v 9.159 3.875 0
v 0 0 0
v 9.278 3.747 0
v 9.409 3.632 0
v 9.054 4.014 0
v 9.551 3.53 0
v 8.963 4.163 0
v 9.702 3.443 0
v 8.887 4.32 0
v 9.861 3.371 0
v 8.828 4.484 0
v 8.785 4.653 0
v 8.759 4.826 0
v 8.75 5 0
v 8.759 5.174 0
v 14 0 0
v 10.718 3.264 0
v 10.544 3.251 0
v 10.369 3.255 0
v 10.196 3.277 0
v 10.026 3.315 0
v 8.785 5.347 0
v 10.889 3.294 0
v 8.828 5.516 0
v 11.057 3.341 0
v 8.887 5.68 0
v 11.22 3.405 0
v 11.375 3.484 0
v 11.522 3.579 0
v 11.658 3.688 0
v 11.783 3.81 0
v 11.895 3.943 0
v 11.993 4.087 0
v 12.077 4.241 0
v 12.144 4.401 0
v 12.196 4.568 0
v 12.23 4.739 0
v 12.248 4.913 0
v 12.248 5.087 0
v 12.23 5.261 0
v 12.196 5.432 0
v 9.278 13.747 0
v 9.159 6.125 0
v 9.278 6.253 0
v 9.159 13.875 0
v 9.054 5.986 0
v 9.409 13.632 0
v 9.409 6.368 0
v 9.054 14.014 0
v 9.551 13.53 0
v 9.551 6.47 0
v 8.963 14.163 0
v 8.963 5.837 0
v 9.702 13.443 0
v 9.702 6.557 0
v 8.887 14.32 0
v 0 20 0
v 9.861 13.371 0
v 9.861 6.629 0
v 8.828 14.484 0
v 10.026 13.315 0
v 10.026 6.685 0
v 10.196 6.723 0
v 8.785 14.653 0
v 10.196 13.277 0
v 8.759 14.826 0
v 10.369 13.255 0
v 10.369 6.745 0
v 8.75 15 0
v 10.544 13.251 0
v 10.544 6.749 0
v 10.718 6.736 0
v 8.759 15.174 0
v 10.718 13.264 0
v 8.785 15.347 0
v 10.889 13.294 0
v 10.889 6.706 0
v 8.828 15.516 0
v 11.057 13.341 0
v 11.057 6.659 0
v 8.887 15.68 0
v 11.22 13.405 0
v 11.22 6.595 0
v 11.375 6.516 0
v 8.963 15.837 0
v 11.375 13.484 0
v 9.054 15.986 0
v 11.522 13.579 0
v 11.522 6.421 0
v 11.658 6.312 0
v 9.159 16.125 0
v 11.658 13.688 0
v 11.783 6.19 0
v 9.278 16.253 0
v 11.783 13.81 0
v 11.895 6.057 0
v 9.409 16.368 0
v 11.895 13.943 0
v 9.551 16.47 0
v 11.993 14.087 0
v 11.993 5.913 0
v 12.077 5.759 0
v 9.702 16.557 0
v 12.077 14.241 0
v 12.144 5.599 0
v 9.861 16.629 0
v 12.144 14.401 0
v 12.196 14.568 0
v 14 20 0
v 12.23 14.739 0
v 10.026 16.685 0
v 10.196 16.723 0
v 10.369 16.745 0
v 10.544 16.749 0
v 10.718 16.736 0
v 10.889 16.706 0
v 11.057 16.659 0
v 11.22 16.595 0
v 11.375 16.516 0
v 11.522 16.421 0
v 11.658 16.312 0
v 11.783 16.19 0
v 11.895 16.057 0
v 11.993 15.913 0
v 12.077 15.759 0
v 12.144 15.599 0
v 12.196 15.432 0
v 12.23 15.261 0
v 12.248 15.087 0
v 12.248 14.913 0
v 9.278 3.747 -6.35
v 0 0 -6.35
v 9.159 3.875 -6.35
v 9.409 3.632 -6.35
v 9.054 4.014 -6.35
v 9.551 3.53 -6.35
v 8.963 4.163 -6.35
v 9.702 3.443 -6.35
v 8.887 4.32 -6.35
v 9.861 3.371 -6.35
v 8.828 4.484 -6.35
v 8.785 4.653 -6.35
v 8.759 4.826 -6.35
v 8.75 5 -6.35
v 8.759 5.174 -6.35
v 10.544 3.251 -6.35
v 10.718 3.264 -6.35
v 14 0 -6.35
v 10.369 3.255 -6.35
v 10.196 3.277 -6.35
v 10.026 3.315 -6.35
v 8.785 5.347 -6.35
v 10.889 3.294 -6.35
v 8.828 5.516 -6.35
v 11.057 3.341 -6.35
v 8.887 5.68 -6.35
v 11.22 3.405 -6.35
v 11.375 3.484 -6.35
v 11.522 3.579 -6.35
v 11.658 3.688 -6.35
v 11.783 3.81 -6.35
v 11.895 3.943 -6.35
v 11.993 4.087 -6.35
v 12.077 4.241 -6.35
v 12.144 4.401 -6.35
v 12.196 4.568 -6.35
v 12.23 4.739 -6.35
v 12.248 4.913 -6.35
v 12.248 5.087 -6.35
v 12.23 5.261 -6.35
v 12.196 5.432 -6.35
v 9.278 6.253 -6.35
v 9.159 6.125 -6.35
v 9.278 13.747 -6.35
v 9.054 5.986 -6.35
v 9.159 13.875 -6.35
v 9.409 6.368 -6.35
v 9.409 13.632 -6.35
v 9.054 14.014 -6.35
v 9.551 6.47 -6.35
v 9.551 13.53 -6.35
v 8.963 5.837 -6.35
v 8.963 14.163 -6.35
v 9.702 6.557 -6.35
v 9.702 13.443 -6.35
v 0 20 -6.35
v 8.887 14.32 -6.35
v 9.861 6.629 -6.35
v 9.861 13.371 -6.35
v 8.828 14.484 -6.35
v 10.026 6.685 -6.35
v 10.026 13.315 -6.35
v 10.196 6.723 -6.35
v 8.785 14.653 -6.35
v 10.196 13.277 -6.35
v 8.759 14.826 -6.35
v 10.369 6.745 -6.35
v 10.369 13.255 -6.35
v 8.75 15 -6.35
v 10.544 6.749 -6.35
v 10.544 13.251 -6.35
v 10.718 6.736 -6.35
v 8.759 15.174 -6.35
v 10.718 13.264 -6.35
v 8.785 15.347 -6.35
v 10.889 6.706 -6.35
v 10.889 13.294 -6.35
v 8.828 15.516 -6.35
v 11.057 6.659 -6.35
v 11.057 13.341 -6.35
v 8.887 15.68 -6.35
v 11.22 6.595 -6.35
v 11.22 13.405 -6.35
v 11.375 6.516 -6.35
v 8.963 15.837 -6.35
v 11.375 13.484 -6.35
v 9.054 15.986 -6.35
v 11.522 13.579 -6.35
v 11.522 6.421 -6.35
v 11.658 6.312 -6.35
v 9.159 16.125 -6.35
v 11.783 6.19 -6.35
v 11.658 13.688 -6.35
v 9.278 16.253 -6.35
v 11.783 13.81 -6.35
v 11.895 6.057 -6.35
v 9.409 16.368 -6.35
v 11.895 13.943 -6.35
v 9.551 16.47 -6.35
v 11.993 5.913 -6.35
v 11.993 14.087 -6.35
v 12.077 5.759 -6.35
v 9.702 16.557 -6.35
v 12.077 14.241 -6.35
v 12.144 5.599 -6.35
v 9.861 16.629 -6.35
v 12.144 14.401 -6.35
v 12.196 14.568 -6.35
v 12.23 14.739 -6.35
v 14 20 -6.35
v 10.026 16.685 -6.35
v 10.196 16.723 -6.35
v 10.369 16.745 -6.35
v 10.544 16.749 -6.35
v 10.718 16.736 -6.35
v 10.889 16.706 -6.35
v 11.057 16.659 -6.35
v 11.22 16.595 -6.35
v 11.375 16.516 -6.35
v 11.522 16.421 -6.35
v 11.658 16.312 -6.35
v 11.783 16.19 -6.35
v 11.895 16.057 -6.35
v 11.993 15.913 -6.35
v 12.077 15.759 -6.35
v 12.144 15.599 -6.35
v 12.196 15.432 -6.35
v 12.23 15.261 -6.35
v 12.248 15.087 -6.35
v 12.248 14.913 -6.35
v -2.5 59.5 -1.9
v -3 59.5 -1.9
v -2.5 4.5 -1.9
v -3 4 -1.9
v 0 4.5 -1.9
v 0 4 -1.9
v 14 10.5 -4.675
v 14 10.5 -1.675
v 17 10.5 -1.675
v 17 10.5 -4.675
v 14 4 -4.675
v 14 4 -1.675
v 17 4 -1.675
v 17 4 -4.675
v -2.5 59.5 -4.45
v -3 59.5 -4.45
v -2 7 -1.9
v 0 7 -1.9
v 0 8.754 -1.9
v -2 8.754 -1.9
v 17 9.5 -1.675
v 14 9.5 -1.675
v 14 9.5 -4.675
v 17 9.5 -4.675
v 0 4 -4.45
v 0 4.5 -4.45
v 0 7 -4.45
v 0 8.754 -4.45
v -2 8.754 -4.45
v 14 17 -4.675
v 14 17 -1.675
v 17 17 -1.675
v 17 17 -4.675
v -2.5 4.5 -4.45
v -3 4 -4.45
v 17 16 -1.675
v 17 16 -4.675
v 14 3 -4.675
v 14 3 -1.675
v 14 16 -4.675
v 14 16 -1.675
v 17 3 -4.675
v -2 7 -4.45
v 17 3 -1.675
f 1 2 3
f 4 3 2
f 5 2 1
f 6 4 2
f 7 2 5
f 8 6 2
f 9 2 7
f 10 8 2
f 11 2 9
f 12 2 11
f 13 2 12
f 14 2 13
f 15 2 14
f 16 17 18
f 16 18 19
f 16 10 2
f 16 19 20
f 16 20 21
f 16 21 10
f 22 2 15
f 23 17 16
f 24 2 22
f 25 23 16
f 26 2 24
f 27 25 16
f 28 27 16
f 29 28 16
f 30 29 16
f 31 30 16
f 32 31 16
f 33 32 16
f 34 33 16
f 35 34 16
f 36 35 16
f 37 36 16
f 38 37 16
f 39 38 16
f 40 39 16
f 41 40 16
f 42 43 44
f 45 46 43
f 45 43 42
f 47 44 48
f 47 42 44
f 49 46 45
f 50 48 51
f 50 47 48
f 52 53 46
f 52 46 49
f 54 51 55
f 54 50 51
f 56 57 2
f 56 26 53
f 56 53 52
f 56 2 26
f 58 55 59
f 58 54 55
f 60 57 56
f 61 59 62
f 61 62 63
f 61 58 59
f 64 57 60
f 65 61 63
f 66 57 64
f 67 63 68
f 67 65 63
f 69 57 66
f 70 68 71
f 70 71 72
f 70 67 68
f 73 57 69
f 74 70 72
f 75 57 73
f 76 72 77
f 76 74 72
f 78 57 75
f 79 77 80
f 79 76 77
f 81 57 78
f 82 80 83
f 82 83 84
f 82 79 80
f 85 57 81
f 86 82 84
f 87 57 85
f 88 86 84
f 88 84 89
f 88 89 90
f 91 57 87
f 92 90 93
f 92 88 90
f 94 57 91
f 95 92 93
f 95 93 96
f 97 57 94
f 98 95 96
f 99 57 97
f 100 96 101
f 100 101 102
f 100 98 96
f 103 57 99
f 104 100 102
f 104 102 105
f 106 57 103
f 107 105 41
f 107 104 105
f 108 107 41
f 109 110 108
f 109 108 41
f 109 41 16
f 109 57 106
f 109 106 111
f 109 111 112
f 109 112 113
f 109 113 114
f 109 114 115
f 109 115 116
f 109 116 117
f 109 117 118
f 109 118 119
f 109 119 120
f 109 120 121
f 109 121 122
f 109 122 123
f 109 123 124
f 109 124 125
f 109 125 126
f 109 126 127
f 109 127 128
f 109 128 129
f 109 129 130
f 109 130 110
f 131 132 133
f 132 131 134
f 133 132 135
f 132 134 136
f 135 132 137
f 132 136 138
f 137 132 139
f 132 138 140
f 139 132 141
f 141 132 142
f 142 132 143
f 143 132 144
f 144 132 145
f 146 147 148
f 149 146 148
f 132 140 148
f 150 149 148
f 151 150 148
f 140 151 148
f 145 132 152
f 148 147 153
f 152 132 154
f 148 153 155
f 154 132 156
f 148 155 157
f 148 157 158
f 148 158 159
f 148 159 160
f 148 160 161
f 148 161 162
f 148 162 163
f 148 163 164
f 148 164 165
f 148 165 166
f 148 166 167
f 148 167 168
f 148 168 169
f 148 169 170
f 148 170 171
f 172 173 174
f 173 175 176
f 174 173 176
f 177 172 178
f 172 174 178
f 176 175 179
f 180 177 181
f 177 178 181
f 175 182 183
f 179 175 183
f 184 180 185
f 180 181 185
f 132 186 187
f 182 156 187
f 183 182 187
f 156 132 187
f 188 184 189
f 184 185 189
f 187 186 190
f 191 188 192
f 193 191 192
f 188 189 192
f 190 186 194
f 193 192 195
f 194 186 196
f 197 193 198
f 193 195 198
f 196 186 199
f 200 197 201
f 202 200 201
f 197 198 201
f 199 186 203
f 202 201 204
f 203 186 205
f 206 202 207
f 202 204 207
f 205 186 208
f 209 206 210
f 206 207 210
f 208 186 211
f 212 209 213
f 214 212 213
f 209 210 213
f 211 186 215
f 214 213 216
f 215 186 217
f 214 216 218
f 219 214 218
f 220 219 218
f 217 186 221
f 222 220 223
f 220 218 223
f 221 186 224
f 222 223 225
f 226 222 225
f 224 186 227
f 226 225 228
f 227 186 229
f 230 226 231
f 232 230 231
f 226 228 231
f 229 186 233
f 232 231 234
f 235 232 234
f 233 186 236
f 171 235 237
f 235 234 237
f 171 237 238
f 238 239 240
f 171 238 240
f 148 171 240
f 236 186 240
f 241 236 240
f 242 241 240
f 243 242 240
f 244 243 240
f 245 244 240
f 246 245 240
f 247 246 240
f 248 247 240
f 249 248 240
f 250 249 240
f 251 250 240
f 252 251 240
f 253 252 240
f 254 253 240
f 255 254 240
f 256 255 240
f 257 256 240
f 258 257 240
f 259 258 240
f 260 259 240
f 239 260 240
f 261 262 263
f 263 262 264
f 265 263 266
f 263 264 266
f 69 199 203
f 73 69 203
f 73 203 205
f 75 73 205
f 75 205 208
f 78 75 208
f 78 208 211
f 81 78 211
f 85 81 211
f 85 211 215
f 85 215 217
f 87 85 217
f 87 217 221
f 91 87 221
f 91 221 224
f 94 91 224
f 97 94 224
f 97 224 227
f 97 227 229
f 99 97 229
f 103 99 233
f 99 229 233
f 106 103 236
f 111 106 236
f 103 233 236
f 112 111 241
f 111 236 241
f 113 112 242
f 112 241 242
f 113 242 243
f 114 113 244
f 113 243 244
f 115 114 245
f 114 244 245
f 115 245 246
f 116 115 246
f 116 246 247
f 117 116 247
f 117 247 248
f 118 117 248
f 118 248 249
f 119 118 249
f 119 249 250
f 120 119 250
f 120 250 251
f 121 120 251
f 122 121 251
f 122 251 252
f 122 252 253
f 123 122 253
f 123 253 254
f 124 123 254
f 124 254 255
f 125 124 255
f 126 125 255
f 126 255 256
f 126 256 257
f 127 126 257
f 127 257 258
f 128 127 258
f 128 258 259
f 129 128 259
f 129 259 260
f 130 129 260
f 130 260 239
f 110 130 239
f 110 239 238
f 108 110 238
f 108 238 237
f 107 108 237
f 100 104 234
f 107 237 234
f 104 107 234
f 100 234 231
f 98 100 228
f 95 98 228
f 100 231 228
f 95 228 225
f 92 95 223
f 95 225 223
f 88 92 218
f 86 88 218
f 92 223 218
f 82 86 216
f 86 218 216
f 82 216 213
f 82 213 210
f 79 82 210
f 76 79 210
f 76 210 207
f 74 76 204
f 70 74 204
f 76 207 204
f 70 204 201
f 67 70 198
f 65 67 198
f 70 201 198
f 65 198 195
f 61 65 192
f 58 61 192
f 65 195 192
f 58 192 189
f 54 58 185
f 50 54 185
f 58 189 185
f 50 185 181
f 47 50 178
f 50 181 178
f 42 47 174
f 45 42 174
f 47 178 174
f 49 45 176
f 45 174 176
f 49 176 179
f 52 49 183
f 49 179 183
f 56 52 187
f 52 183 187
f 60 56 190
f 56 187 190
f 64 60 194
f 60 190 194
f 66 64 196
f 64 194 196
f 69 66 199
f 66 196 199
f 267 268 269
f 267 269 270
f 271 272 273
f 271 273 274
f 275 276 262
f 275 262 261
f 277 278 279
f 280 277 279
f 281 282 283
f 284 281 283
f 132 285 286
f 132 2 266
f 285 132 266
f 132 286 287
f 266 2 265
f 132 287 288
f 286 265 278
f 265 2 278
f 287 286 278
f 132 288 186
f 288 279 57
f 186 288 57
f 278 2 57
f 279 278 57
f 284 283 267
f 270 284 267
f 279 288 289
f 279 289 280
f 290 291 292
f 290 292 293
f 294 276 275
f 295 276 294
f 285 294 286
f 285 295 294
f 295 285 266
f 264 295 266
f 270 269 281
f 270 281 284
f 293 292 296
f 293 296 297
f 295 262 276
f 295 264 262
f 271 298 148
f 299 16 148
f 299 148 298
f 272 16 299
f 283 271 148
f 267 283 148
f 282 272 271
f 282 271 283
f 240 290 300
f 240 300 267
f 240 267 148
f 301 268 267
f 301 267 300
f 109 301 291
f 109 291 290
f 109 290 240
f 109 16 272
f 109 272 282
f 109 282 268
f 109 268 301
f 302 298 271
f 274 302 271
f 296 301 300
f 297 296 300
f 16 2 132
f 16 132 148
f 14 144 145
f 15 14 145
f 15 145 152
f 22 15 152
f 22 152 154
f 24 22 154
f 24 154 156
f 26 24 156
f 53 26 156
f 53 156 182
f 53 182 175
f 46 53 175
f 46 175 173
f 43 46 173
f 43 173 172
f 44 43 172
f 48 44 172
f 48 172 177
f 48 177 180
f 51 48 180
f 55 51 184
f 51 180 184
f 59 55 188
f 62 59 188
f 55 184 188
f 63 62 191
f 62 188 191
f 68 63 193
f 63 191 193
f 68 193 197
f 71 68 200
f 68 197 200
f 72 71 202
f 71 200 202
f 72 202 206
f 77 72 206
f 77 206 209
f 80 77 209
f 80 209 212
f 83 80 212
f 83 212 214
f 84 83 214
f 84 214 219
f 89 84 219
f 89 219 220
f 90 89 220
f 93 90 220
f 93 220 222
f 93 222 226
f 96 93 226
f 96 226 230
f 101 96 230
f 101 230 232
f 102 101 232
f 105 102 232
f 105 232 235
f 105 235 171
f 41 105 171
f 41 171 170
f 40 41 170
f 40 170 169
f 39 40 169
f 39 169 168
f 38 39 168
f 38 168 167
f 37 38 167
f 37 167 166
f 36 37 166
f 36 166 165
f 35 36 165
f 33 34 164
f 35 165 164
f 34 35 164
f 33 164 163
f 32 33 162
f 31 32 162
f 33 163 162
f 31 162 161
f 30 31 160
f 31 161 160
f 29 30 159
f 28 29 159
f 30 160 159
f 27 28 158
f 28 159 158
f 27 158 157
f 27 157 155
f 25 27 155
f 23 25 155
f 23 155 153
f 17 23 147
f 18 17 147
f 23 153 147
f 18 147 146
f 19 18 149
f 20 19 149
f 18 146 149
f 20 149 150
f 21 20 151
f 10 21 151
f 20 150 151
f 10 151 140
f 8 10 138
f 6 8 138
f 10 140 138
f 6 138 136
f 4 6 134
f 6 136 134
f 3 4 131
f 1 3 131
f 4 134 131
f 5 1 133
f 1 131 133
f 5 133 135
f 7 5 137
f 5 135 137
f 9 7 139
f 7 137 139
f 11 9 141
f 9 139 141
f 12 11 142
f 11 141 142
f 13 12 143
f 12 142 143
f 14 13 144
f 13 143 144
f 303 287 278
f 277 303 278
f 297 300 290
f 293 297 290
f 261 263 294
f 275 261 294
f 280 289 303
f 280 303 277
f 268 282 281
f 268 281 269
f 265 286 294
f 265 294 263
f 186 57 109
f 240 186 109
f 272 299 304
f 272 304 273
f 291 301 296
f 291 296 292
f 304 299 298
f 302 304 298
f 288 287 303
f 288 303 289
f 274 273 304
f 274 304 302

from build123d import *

# Parameters (mm, degrees)
SKETCH1_W             = 14
SKETCH1_H             = 20
BOSS_EXTRUDE1_DEPTH   = 6.35
SKETCH2_W             = 2.55
SKETCH2_H             = 1.754165379
BOSS_EXTRUDE2_DEPTH   = 2
SKETCH3_W             = 2.55
SKETCH3_H             = 0.5
BOSS_EXTRUDE3_DEPTH   = 3
SKETCH4_W             = 0.5
SKETCH4_H             = 2.55
BOSS_EXTRUDE4_DEPTH   = 55
SKETCH5_W             = 3
SKETCH5_H             = 1
BOSS_EXTRUDE5_DEPTH   = 3
F_3_0MM_DOWEL_HOLE1_D = 3.5


with BuildPart() as part:
    # Sketch1 → Boss-Extrude1 (new body)
    with BuildSketch(Plane.XY):
        with Locations((7, 10)):
            Rectangle(SKETCH1_W, SKETCH1_H)
    extrude(amount=-BOSS_EXTRUDE1_DEPTH)

    # Sketch2 → Boss-Extrude2 (add)
    with BuildSketch(Plane.ZY):
        with Locations((-3.175, 7.877082689)):
            Rectangle(SKETCH2_W, SKETCH2_H)
    extrude(amount=BOSS_EXTRUDE2_DEPTH)

    # Sketch3 → Boss-Extrude3 (add)
    with BuildSketch(Plane.ZY):
        with Locations((-3.175, 4.25)):
            Rectangle(SKETCH3_W, SKETCH3_H)
    extrude(amount=BOSS_EXTRUDE3_DEPTH)

    # Sketch4 → Boss-Extrude4 (add)
    with BuildSketch(Plane(origin=(0, 4.5, 0), x_dir=(1, 0, 0), z_dir=(0, 1, 0))):
        with Locations((-2.75, 3.175)):
            Rectangle(SKETCH4_W, SKETCH4_H)
    extrude(amount=BOSS_EXTRUDE4_DEPTH)

    # Sketch5 → Boss-Extrude5 (add)
    with BuildSketch(Plane(origin=(14, 0, 0), x_dir=(0, 0, -1), z_dir=(1, 0, 0))):
        with Locations((3.175, 3.5)):
            Rectangle(SKETCH5_W, SKETCH5_H)
        with Locations((3.175, 10)):
            Rectangle(SKETCH5_W, SKETCH5_H)
        with Locations((3.175, 16.5)):
            Rectangle(SKETCH5_W, SKETCH5_H)
    extrude(amount=BOSS_EXTRUDE5_DEPTH)

    # Ø3.0mm Dowel Hole1 (through all)
    with Locations(Plane(origin=(10.5, 15, 0), x_dir=(1, 0, 0), z_dir=(0, 0, 1))):
        with Locations((0, 0), (0, -10)):
            Hole(F_3_0MM_DOWEL_HOLE1_D / 2)


solid = part.part
